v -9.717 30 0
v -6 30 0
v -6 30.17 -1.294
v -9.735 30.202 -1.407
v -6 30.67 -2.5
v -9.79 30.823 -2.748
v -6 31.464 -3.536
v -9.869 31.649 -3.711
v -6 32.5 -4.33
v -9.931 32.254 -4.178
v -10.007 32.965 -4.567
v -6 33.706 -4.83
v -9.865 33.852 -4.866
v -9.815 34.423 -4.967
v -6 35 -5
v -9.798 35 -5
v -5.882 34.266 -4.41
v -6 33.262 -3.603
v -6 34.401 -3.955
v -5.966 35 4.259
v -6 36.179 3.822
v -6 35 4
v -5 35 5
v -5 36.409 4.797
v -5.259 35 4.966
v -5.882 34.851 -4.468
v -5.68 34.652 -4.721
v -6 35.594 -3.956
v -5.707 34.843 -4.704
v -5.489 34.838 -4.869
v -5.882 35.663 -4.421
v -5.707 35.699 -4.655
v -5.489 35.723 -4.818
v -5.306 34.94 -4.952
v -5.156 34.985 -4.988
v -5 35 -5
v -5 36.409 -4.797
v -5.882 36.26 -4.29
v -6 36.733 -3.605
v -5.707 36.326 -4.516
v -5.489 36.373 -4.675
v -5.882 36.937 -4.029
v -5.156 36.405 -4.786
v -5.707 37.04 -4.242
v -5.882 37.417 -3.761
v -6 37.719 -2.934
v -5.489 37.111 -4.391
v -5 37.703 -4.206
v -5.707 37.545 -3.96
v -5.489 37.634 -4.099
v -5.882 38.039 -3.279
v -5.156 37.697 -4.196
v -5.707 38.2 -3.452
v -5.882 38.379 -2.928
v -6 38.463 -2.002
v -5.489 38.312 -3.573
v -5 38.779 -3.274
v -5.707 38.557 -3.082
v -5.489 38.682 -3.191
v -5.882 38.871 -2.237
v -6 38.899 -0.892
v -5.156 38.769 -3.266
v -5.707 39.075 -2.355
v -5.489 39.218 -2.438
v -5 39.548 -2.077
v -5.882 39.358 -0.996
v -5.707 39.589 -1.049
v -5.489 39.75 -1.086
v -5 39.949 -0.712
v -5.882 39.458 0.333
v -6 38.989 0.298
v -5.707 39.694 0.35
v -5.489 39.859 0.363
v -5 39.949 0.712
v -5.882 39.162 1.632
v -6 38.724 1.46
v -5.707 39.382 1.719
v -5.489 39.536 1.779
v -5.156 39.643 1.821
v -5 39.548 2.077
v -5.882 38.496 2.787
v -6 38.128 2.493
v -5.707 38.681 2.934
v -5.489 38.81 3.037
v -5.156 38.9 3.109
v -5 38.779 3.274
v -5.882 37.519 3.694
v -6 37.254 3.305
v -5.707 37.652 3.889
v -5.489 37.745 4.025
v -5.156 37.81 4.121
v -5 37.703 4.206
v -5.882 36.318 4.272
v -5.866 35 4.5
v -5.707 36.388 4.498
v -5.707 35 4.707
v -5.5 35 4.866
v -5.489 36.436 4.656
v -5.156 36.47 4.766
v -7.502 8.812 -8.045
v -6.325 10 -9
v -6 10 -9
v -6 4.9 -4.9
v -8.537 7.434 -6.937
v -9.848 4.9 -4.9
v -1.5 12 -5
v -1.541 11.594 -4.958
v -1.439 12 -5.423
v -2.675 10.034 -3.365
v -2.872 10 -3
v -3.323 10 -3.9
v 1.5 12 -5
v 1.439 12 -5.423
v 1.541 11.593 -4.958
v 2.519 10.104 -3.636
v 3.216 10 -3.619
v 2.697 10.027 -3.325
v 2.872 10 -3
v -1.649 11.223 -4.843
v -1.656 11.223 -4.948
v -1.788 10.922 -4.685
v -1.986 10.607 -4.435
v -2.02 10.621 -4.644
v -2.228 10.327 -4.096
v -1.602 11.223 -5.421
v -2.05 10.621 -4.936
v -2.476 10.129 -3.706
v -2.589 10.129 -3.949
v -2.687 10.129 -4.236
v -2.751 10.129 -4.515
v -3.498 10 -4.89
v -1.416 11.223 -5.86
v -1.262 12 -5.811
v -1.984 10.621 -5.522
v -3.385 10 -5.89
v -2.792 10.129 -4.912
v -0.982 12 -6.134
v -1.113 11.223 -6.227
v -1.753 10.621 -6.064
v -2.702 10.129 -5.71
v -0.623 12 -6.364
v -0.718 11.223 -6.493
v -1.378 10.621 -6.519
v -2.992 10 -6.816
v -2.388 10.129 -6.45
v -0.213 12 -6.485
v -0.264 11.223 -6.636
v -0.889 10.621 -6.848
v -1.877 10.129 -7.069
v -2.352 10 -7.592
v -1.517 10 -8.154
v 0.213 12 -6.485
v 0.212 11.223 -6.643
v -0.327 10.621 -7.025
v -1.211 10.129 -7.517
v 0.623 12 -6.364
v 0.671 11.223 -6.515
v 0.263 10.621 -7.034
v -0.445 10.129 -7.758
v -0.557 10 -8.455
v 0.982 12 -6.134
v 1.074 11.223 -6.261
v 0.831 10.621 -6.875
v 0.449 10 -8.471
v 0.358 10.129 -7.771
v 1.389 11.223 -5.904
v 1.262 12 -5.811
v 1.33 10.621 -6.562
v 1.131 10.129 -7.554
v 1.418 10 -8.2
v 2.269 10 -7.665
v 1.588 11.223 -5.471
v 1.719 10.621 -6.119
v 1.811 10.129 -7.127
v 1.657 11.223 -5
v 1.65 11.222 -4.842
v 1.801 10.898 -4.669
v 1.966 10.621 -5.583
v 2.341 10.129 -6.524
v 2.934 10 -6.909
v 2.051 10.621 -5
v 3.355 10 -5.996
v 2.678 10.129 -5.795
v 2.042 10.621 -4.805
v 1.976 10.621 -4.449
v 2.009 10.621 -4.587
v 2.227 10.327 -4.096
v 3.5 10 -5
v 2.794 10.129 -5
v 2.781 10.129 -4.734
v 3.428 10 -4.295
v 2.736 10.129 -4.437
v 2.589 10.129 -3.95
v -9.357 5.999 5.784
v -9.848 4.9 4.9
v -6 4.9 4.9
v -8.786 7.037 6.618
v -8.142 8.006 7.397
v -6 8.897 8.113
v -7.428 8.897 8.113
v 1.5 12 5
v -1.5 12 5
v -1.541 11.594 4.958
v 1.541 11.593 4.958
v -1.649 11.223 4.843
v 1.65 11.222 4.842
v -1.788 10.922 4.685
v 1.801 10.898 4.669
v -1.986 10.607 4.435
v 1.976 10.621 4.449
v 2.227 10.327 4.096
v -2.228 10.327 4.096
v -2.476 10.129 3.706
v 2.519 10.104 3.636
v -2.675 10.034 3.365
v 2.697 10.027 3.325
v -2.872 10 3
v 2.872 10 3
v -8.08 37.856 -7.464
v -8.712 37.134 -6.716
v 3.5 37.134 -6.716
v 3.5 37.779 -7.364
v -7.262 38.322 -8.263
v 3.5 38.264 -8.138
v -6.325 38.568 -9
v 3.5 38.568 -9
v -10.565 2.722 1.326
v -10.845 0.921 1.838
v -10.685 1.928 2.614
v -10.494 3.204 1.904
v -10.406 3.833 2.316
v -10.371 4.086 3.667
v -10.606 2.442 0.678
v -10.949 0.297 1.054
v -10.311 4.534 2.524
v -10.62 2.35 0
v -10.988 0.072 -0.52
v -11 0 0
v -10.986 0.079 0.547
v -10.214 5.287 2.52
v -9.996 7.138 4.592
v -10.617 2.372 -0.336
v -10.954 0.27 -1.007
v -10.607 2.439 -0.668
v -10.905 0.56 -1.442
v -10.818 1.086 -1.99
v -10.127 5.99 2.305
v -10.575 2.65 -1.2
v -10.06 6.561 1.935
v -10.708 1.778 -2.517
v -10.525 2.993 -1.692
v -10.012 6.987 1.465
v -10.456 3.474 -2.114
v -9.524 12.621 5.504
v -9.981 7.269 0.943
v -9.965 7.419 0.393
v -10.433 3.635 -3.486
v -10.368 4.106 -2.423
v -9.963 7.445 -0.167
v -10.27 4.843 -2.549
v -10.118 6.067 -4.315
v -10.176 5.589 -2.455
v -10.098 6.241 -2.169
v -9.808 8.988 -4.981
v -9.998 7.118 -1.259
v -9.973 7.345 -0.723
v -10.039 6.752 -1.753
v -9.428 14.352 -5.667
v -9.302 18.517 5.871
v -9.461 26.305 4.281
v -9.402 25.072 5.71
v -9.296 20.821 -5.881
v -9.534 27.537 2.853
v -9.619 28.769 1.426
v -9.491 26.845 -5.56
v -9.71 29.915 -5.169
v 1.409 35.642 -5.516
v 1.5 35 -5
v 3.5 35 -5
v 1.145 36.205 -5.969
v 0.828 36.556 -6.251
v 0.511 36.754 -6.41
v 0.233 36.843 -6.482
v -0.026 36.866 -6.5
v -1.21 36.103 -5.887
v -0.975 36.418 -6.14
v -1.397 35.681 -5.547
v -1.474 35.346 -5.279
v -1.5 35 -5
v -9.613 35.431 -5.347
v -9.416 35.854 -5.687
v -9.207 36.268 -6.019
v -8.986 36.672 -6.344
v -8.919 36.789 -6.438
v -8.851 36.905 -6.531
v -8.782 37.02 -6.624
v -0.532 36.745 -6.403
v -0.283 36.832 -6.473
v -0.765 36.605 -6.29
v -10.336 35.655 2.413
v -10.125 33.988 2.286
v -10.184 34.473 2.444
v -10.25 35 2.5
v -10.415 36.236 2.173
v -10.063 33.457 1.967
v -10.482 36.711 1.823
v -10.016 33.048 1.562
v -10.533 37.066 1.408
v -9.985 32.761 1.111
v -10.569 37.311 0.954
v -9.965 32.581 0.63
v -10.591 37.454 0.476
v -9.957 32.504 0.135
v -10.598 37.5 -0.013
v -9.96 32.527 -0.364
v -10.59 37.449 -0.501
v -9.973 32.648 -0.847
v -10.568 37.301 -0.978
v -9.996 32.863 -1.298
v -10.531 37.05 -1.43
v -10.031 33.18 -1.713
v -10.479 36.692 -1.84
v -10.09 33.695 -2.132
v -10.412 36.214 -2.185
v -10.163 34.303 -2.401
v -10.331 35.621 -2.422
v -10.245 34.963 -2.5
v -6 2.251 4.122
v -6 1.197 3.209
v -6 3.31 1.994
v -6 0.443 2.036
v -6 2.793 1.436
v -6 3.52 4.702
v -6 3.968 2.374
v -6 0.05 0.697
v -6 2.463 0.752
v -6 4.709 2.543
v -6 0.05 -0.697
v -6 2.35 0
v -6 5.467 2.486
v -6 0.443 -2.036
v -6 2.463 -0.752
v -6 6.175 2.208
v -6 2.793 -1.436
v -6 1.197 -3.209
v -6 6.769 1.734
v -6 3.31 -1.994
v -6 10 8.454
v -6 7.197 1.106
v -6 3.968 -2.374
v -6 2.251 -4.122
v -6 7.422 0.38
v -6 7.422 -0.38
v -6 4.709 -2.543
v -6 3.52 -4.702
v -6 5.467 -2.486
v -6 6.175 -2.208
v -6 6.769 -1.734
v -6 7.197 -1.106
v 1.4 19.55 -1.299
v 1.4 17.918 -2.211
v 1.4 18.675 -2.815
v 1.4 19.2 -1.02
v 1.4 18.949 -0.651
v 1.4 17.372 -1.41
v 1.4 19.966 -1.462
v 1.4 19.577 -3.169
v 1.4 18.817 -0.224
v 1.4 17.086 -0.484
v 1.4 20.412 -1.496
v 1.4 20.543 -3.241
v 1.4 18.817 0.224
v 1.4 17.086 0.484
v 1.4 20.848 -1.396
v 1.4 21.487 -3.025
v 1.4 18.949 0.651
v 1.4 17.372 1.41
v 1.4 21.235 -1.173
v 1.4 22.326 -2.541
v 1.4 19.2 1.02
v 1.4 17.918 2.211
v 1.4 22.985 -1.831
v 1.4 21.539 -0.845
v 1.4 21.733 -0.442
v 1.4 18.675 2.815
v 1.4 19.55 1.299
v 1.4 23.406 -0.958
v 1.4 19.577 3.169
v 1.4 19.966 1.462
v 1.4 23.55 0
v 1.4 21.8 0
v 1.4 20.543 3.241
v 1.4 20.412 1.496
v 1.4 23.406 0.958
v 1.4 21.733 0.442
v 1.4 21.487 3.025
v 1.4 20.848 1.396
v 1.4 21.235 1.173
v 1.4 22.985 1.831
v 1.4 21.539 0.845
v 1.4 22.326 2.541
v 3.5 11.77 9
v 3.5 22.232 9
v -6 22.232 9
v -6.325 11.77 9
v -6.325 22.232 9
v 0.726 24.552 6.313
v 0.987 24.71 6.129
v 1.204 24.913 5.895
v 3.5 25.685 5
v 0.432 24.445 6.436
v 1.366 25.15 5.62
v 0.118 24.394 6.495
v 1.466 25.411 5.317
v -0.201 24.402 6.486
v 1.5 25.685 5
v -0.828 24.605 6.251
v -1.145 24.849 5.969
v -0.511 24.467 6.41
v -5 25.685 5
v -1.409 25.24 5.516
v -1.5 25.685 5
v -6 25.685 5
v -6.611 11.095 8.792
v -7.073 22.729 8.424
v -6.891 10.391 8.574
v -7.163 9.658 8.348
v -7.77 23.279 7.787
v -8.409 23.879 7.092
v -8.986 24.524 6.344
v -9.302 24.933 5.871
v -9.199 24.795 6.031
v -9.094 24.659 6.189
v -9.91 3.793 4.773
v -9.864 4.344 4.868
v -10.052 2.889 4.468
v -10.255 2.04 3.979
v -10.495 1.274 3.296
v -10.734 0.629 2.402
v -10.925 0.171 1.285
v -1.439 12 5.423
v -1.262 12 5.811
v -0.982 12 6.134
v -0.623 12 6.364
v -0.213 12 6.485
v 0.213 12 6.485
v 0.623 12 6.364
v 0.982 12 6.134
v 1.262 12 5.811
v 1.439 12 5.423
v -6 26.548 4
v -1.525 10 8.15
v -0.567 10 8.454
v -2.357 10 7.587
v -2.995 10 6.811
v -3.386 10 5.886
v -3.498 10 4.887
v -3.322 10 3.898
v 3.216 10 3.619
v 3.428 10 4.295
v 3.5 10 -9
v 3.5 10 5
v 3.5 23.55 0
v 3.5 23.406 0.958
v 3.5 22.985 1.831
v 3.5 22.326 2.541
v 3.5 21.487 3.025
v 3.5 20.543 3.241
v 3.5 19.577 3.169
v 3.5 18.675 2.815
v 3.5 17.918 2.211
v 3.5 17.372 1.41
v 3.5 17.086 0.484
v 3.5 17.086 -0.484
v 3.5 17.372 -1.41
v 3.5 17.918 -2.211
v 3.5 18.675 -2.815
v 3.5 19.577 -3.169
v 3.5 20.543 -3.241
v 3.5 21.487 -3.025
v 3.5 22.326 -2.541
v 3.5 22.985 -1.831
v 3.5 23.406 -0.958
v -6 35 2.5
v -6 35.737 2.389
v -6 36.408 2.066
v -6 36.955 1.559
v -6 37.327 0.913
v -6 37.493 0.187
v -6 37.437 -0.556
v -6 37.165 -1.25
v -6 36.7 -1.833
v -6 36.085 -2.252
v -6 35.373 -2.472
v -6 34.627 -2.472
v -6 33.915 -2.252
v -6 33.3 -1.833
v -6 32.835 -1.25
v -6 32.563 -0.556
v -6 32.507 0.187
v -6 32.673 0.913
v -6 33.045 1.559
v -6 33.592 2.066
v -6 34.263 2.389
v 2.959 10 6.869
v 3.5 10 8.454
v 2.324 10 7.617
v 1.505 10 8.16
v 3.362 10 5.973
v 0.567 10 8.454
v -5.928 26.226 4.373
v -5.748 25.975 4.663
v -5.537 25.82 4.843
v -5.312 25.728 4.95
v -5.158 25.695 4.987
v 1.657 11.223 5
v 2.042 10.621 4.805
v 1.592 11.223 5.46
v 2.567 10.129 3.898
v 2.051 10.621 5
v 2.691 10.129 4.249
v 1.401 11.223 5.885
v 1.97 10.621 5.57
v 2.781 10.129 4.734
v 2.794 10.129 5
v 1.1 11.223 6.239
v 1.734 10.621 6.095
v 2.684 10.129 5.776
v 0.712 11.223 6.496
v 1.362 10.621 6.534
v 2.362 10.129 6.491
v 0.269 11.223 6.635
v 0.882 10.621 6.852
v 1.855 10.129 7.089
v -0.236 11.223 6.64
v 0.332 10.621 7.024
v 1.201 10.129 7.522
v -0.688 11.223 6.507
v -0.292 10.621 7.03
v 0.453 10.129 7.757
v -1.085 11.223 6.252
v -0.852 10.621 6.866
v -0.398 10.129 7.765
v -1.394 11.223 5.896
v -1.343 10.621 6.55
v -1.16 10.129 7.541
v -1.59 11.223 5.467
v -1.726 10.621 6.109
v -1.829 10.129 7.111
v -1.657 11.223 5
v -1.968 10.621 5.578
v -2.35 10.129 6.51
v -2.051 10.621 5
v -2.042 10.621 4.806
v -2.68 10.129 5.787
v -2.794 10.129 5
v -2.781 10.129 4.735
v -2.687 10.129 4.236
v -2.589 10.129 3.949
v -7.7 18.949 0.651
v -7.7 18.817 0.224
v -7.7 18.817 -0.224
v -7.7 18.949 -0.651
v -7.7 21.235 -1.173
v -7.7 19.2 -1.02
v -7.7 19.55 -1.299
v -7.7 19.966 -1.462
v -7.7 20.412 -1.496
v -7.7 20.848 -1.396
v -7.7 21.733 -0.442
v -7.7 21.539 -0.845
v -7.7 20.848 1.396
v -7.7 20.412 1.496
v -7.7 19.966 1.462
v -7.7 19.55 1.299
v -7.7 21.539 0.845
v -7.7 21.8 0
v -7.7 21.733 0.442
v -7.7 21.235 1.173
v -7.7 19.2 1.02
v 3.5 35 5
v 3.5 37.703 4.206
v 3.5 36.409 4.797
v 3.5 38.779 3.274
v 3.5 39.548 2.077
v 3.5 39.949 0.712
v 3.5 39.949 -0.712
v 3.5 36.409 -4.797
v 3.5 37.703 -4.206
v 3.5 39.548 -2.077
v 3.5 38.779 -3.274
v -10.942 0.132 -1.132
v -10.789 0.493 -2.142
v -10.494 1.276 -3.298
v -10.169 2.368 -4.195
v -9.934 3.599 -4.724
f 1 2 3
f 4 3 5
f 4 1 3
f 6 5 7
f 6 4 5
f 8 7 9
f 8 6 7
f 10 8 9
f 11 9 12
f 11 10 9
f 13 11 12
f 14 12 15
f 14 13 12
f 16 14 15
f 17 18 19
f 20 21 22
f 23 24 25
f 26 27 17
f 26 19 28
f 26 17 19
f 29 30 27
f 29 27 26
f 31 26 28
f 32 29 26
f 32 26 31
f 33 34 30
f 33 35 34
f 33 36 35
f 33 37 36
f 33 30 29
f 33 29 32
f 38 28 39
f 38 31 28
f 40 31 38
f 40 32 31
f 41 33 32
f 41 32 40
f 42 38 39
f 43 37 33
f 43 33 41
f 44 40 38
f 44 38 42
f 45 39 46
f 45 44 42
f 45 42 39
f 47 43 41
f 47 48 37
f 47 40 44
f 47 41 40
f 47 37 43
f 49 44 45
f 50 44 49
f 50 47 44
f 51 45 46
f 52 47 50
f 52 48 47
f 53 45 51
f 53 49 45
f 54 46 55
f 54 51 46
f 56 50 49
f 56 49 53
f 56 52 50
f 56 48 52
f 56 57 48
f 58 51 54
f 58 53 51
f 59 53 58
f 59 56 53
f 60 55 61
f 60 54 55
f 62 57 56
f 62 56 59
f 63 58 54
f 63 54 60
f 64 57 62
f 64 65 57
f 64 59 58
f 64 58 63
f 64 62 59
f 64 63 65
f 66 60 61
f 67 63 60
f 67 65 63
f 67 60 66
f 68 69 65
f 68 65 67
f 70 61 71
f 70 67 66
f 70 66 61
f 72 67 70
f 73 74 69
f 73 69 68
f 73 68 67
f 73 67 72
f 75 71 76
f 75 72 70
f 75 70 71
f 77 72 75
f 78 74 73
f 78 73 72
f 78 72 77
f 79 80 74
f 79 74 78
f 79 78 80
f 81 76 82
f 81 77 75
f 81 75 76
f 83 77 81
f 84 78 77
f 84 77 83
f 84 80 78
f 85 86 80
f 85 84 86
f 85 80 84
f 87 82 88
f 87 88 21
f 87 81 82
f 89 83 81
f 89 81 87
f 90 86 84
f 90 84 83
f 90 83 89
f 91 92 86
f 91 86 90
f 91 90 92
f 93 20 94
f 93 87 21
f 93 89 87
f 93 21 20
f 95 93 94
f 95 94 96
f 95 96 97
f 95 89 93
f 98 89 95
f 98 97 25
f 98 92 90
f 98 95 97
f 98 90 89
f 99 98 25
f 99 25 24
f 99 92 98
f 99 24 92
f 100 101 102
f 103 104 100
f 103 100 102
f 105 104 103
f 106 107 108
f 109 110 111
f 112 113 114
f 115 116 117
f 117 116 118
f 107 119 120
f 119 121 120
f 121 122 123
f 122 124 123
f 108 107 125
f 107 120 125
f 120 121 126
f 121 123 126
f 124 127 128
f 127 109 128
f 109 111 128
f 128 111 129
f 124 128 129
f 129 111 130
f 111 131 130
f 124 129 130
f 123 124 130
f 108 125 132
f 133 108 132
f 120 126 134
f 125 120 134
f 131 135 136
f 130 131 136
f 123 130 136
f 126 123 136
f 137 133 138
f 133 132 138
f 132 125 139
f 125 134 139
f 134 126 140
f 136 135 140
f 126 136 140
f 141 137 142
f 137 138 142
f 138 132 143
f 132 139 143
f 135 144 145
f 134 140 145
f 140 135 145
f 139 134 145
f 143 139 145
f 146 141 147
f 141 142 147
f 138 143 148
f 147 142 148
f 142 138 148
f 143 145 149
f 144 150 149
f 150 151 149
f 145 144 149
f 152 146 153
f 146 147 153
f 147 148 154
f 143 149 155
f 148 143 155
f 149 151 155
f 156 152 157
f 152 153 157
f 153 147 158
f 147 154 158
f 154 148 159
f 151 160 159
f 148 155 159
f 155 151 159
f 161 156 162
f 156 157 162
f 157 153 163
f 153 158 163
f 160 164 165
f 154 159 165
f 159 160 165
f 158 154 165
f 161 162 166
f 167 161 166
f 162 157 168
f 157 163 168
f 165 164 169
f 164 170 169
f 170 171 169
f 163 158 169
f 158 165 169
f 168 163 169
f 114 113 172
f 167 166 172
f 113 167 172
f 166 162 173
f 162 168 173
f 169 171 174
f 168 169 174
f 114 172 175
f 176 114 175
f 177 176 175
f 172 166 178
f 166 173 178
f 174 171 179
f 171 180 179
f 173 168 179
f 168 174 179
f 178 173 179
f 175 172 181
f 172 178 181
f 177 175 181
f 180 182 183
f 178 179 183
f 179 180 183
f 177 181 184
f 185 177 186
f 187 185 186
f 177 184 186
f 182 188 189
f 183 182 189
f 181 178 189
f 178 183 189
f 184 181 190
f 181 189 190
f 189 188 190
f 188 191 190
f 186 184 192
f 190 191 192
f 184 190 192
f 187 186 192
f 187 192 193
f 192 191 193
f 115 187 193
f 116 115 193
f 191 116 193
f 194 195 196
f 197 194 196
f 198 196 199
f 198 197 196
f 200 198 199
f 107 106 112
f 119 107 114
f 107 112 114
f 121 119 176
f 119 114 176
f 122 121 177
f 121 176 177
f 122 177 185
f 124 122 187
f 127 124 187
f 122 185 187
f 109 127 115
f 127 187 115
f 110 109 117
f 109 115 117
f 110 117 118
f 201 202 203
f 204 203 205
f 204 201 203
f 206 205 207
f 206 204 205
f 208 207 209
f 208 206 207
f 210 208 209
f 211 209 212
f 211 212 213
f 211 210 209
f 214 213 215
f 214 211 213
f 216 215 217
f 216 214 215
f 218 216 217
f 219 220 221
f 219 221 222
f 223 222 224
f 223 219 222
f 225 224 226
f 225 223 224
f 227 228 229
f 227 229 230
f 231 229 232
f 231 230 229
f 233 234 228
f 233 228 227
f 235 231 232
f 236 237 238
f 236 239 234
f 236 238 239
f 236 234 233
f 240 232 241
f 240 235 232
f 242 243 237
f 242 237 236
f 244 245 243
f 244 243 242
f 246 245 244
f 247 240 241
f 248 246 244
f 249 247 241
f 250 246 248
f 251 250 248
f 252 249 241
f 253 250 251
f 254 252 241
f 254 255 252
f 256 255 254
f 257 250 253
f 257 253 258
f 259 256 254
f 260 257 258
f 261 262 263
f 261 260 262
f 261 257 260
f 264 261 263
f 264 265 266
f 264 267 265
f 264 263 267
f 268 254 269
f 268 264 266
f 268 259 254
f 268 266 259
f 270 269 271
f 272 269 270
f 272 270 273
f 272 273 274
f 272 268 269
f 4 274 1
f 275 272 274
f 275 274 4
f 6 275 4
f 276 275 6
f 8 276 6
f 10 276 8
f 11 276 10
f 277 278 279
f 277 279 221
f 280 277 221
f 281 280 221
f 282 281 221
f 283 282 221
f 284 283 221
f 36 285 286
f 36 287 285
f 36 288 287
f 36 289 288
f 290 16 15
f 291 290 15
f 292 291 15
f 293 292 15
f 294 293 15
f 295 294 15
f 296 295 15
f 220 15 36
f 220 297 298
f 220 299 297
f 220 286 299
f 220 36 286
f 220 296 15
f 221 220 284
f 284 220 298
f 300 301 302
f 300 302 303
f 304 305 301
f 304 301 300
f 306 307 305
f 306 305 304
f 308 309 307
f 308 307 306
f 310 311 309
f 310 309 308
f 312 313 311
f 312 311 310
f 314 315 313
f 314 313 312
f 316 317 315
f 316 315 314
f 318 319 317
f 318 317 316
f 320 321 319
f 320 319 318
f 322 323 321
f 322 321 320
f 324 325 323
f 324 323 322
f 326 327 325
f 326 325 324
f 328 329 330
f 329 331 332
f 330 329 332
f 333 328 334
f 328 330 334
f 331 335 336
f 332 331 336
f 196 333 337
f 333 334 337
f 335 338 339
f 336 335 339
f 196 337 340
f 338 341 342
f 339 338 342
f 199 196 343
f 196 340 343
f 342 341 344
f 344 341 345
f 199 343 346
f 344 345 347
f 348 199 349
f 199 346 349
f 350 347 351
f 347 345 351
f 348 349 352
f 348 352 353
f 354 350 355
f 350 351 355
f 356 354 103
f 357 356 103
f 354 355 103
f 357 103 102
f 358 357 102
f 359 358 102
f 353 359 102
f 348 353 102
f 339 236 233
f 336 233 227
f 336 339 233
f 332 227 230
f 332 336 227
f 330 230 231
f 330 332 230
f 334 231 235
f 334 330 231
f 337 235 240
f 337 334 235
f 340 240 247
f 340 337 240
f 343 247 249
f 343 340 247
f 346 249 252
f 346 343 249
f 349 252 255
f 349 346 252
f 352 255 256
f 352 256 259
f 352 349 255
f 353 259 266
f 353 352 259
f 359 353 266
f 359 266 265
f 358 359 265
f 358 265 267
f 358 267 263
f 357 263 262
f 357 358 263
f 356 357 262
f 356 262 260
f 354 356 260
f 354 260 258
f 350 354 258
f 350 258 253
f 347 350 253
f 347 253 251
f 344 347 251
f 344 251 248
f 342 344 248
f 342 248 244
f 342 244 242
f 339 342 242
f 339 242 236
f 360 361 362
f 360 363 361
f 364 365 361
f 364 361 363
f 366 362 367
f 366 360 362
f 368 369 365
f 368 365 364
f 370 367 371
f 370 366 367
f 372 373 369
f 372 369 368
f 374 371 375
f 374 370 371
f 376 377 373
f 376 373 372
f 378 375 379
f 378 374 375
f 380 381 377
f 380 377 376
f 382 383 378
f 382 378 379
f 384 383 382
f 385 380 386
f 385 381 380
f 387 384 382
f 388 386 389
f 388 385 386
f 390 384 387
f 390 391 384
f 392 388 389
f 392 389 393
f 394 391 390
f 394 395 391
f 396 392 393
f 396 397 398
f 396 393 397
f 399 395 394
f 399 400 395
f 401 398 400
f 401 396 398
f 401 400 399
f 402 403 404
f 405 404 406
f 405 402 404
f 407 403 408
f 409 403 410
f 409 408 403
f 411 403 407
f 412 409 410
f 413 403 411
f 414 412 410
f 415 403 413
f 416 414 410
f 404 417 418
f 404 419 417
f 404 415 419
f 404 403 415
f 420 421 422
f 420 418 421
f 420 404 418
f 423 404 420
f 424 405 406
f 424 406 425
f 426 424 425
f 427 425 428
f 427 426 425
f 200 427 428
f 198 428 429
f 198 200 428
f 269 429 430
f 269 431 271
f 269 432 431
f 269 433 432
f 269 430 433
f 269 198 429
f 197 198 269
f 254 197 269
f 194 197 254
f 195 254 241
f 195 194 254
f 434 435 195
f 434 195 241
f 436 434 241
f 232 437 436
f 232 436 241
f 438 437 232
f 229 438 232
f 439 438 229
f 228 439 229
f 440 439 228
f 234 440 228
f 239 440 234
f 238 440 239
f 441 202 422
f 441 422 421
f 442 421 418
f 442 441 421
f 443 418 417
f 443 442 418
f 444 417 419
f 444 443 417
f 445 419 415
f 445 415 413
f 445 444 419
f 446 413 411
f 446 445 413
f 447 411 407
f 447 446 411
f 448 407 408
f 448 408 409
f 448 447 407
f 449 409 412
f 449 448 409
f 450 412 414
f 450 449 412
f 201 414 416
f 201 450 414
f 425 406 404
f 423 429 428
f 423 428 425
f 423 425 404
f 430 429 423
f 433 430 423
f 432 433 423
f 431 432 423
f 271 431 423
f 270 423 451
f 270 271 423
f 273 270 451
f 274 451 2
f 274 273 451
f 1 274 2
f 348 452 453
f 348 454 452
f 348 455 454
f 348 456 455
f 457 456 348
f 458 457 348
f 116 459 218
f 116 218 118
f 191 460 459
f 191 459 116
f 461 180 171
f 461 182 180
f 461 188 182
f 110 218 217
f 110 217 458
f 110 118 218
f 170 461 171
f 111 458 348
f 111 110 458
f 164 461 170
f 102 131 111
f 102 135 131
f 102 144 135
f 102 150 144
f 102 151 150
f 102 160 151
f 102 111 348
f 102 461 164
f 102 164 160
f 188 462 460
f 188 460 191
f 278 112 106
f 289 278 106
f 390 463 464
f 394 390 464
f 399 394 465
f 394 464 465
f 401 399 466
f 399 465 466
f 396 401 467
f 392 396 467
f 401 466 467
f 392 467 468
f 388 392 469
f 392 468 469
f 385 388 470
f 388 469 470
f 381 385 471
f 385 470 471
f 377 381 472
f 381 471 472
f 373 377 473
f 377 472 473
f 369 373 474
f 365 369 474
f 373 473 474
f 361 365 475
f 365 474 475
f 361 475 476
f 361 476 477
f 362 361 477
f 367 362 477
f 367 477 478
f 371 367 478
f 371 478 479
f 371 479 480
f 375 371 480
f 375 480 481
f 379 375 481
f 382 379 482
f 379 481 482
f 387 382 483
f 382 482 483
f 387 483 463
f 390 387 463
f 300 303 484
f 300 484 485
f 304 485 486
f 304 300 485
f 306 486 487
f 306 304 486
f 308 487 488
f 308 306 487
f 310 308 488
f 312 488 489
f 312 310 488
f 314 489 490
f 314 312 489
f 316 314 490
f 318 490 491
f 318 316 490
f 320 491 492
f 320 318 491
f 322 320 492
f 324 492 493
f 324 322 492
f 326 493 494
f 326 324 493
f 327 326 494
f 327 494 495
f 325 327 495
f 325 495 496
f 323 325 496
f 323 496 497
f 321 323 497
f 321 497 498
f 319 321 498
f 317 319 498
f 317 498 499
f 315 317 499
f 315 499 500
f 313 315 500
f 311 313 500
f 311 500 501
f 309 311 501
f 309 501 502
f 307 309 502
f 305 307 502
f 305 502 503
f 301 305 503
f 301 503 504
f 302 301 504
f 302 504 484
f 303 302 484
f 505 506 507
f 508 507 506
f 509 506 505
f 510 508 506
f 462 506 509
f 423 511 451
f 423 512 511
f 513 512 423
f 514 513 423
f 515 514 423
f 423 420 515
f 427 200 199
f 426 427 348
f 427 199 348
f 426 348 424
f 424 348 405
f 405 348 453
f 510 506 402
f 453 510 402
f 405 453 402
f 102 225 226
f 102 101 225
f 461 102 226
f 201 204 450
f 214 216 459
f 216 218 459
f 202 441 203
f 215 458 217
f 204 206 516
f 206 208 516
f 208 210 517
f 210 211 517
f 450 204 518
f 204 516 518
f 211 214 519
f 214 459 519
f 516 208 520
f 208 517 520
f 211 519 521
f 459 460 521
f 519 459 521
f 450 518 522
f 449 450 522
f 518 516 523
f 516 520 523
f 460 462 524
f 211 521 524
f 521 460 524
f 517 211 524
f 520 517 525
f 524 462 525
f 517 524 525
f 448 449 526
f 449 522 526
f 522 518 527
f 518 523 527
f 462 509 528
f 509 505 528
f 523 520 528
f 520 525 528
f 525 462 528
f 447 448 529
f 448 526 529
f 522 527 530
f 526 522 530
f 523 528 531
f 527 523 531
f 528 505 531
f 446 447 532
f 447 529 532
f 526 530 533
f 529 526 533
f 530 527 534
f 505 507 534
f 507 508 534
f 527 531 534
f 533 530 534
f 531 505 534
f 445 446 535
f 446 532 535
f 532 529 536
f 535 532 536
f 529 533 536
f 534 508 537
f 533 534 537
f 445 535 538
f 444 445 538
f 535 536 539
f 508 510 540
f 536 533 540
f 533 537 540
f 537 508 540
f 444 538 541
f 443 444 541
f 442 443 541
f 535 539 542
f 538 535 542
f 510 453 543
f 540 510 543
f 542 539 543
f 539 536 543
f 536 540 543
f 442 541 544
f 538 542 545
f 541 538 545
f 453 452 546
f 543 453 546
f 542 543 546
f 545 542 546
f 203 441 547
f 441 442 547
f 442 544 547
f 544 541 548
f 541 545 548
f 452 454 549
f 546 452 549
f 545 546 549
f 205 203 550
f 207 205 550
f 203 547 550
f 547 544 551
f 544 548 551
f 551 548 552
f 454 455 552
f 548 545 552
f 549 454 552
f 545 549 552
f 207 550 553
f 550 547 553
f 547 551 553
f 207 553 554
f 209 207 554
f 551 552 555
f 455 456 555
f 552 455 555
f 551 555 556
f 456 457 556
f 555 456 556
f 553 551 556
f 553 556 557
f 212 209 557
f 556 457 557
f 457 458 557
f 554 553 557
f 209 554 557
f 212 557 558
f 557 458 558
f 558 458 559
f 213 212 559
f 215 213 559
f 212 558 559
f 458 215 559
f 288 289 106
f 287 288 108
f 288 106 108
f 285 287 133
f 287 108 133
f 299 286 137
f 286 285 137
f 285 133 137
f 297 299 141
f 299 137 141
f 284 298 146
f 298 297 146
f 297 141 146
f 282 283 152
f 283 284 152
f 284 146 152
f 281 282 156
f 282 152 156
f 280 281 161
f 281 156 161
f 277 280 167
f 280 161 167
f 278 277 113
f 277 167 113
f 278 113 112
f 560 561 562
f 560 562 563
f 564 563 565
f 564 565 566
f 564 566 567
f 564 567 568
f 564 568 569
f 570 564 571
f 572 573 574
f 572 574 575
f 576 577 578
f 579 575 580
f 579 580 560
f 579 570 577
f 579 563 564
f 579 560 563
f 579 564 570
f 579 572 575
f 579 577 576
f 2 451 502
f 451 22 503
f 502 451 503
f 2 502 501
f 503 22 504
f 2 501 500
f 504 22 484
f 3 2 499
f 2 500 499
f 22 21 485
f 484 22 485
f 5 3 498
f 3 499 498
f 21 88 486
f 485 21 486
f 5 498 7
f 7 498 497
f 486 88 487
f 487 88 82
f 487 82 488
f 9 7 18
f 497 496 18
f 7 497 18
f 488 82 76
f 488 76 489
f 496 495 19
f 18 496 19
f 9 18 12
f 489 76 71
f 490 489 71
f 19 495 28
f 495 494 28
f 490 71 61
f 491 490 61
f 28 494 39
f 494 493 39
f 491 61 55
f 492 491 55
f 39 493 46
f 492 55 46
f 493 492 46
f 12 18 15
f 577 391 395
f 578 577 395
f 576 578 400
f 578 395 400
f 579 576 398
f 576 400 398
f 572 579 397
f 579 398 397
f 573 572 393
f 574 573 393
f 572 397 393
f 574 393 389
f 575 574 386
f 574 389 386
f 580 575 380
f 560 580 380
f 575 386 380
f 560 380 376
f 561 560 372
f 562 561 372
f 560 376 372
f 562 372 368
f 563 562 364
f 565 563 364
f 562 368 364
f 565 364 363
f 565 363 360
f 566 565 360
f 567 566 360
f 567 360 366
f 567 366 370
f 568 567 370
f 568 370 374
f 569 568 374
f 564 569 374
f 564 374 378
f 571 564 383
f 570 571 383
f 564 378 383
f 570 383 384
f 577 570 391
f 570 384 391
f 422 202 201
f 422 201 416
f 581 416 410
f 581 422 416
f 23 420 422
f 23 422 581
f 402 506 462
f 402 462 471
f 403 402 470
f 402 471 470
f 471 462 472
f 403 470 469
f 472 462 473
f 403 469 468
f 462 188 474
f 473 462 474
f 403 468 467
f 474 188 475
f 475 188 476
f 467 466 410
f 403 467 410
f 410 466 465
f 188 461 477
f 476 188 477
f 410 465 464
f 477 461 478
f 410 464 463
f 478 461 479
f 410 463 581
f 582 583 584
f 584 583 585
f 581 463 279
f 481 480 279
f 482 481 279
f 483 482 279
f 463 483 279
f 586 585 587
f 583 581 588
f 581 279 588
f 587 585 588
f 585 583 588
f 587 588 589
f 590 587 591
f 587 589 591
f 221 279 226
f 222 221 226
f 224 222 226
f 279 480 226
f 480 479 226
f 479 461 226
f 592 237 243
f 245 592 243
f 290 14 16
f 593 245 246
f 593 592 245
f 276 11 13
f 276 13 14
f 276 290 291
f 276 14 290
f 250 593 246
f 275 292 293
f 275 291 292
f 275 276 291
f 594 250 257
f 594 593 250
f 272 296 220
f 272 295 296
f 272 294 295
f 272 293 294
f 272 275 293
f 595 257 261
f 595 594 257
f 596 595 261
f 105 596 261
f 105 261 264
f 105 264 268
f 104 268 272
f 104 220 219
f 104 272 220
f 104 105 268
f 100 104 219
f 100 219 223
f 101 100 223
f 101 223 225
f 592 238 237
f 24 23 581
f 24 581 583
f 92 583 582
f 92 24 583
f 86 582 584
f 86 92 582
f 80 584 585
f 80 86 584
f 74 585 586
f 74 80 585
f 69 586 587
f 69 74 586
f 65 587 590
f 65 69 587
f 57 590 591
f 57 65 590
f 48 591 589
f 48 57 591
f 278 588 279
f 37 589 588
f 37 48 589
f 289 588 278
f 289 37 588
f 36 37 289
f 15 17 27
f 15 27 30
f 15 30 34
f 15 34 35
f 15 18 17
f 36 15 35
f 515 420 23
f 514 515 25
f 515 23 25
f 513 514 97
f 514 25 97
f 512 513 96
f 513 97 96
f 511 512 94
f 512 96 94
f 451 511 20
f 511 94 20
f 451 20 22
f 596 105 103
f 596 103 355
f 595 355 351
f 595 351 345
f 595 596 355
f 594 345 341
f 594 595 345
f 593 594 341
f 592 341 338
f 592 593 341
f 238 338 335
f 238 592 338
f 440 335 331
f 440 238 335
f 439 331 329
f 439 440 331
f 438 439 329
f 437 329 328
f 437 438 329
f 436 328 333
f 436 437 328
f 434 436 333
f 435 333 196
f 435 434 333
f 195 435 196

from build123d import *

# Parameters (mm, degrees)
BOSS_EXTRUDE1_DEPTH      = 40
CUT_EXTRUDE1_DEPTH       = 58
CUT_EXTRUDE2_REACH       = 47.222
SKETCH3_W                = 12
SKETCH3_H                = 10
SKETCH4_R                = 2.55
CUT_EXTRUDE3_DEPTH       = 17.5
FILLET4_R                = 2
CUT_EXTRUDE5_START       = -12.324555
SKETCH6_R                = 2.5
CUT_EXTRUDE5_DEPTH       = 9.6
CUT_EXTRUDE6_START       = 6.279445
SKETCH6_3_R              = 2.5
CUT_EXTRUDE6_DEPTH       = 6.604
CUT_EXTRUDE7_START       = -14.986
CUT_EXTRUDE7_DEPTH       = 14.986
CUT_EXTRUDE14_DEPTH      = 10
CUT_EXTRUDE14_DEPTH_BACK = 20
FILLET3_R                = 1
CUT_EXTRUDE17_DEPTH      = 9
CUT_EXTRUDE17_DEPTH_BACK = 31
SKETCH19_W               = 18.14397799
SKETCH19_H               = 52.511082079
SKETCH20_R               = 3.25
CUT_EXTRUDE18_DEPTH      = 2.1
SKETCH21_R               = 1.5
CUT_EXTRUDE19_DEPTH      = 9.1
CUT_EXTRUDE20_DEPTH      = 14
CUT_EXTRUDE20_DEPTH_BACK = 14


with BuildPart() as part:
    # Sketch1 → Boss-Extrude1 (new body)
    with BuildSketch(Plane(origin=(0, 0, 0), x_dir=(1, 0, 0), z_dir=(0, 1, 0))):
        with BuildLine():
            Line((-6.32455532, 9), (6.32455532, 9))
            ThreePointArc((6.32455532, 9), (11, 0), (6.32455532, -9))
            Line((6.32455532, -9), (-6.32455532, -9))
            ThreePointArc((-6.32455532, -9), (-11, 0), (-6.32455532, 9))
        make_face()
    extrude(amount=BOSS_EXTRUDE1_DEPTH)

    # Sketch2 → Cut-Extrude1 (cut)
    with BuildSketch(Plane.XZ):
        with BuildLine():
            Line((1.5, 5), (-1.5, 5))
            ThreePointArc((-1.5, 5), (0, 6.5), (1.5, 5))
        make_face()
        with BuildLine():
            Line((1.5, -5), (-1.5, -5))
            ThreePointArc((-1.5, -5), (0, -6.5), (1.5, -5))
        make_face()
    extrude(amount=-CUT_EXTRUDE1_DEPTH, mode=Mode.SUBTRACT)

    # Cut-Extrude2: up to this face of the body (flat: up to its plane)
    cut_extrude2_end = Plane(part.part.faces().sort_by_distance((0, 20, 9))[0])
    # Sketch3 → Cut-Extrude2 (cut, up to the picked face)
    with BuildSketch(Plane(origin=(0, 0, -9), x_dir=(-1, 0, 0), z_dir=(0, 0, -1)), mode=Mode.PRIVATE) as cut_extrude2_sk1:
        with Locations((0, 5)):
            Rectangle(SKETCH3_W, SKETCH3_H)
    cut_extrude2_tool1 = split(extrude(cut_extrude2_sk1.sketch, amount=-CUT_EXTRUDE2_REACH, mode=Mode.PRIVATE), bisect_by=cut_extrude2_end, keep=Keep.BOTH, mode=Mode.PRIVATE)
    add(cut_extrude2_tool1.solids().sort_by(Axis((0, 5, -9), (0, 0, 1)))[0], mode=Mode.SUBTRACT)

    # Sketch4 → Cut-Extrude3 (cut, symmetric)
    with BuildSketch(Plane.ZY.offset(-6)):
        with Locations(Location((0, 4.9, 0), (0, 0, 270))):
            Circle(SKETCH4_R)
        with BuildLine():
            Line((-9, 10), (-4.9, 4.9))
            ThreePointArc((-4.9, 4.9), (0, 0), (4.9, 4.9))
            Line((4.9, 4.9), (9, 10))
            Line((9, 10), (12.043777938, -1.930413563))
            Line((12.043777938, -1.930413563), (-10.290438773, -1.930413563))
            Line((-10.290438773, -1.930413563), (-9, 10))
        make_face()
    extrude(amount=CUT_EXTRUDE3_DEPTH, both=True, mode=Mode.SUBTRACT)

    # Fillet4
    fillet4_edges = [part.edges().sort_by_distance(p)[0] for p in [
        (0, 10, 5),
        (0, 10, 6.5),
        (0, 10, -5),
        (0, 10, -6.5),
    ]]
    fillet(fillet4_edges, radius=FILLET4_R)

    # Sketch6 → Cut-Extrude5 (cut)
    with BuildSketch(Plane.ZY.offset(6.32455532).offset(CUT_EXTRUDE5_START)):
        with BuildLine():
            Line((9, 22.232353468), (0, 30))
            ThreePointArc((0, 30), (-3.535533906, 31.464466094), (-5, 35))
            Line((-5, 35), (-6.715621335, 37.134065563))
            ThreePointArc((-6.715621335, 37.134065563), (-7.737273484, 38.043034193), (-9, 38.567933069))
            Line((-9, 38.567933069), (-20.985236203, 70.297327945))
            Line((-20.985236203, 70.297327945), (29.827478779, 37.594689174))
            Line((29.827478779, 37.594689174), (9, 22.232353468))
        make_face()
        with Locations((0, 35)):
            Circle(SKETCH6_R, mode=Mode.SUBTRACT)
    extrude(amount=-CUT_EXTRUDE5_DEPTH, mode=Mode.SUBTRACT)

    # Sketch6<3> → Cut-Extrude6 (cut)
    with BuildSketch(Plane.ZY.offset(6.32455532).offset(CUT_EXTRUDE6_START)):
        with BuildLine():
            Line((9, 22.232353468), (0, 30))
            ThreePointArc((0, 30), (-3.535533906, 31.464466094), (-5, 35))
            Line((-5, 35), (-6.715621335, 37.134065563))
            ThreePointArc((-6.715621335, 37.134065563), (-7.737273484, 38.043034193), (-9, 38.567933069))
            Line((-9, 38.567933069), (-20.985236203, 70.297327945))
            Line((-20.985236203, 70.297327945), (29.827478779, 37.594689174))
            Line((29.827478779, 37.594689174), (9, 22.232353468))
        make_face()
        with Locations((0, 35)):
            Circle(SKETCH6_3_R, mode=Mode.SUBTRACT)
    extrude(amount=-CUT_EXTRUDE6_DEPTH, mode=Mode.SUBTRACT)

    # Sketch7 → Cut-Extrude7 (cut)
    with BuildSketch(Plane(origin=(6, 0, 0), x_dir=(0, 0, -1), z_dir=(1, 0, 0)).offset(CUT_EXTRUDE7_START)):
        with BuildLine():
            Line((5, 35), (6.715621335, 37.134065563))
            ThreePointArc((6.715621335, 37.134065563), (7.737273484, 38.043034193), (9, 38.567933069))
            Line((9, 38.567933069), (57.758012517, 25.684640815))
            Line((57.758012517, 25.684640815), (-30.579133969, 55.486762513))
            Line((-30.579133969, 55.486762513), (-9, 22.232353468))
            Line((-9, 22.232353468), (-5, 25.684640815))
            Line((-5, 25.684640815), (-5, 35))
            ThreePointArc((-5, 35), (0, 40), (5, 35))
        make_face()
    extrude(amount=CUT_EXTRUDE7_DEPTH, mode=Mode.SUBTRACT)

    # Sketch16 → Cut-Extrude14 (cut, two sides: drawn at the far end of the back side and taken through both)
    with BuildSketch(Plane.ZY.offset(6.32455532).offset(-CUT_EXTRUDE14_DEPTH_BACK)):
        Polygon((8.113259987, 8.896981935), (11.550119513, 20.031417135), (18.056002312, 15.695207893), (16.156055326, 2.281594324), align=None)
    extrude(amount=CUT_EXTRUDE14_DEPTH + CUT_EXTRUDE14_DEPTH_BACK, mode=Mode.SUBTRACT)

    # Fillet3
    # the kernel refuses this fillet: 1 mm, written as the material it takes off along each edge
    with BuildSketch(Plane(origin=(5.99999968, 23.184640014, 5), x_dir=(-1, 0, 0), z_dir=(0, 1, 0))) as fillet3_piece_1_section:
        with BuildLine():
            CenterArc((FILLET3_R, -FILLET3_R), FILLET3_R, 90, 90)
            Line((0, -FILLET3_R), (0, 0))
            Line((0, 0), (FILLET3_R, 0))
        make_face()
    fillet3_piece_1 = extrude(amount=11.815359986, mode=Mode.PRIVATE)
    fillet3_piece_1 = split(fillet3_piece_1, bisect_by=Plane(origin=(5.764976342, 27.542151825, 2.84779096), z_dir=(0, 0.7570343753275034, 0.653375048936288)), keep=Keep.TOP, mode=Mode.PRIVATE)
    add(fillet3_piece_1, mode=Mode.SUBTRACT)
    with BuildSketch(Plane(origin=(6, 35, 0), x_dir=(0, 0, 1), z_dir=(0, -1, 0))) as fillet3_piece_2_section:
        with BuildLine():
            CenterArc((4, 1.00000032), FILLET3_R, 270, 90)
            ThreePointArc((4, 3.2e-07), (4.5, 3.2e-07), (5, 0))
            Line((5, 0), (5, 1.00000032))
        make_face()
    fillet3_piece_2 = revolve(axis=Axis((6, 35, 0), (-1, 0, 0)), revolution_arc=208.693968336, mode=Mode.PRIVATE)
    fillet3_piece_2 = split(fillet3_piece_2, bisect_by=Plane(origin=(5.717618036, 35.865387036, -5.695703303), z_dir=(0, 0.6265569118246592, 0.7793756708062848)), keep=Keep.TOP, mode=Mode.PRIVATE)
    add(fillet3_piece_2, mode=Mode.SUBTRACT)
    with BuildSketch(Plane(origin=(-6.00000032, 35, 0), x_dir=(0, -0.48013104288571373, -0.8771967747646344), z_dir=(0, -0.8771967747646344, 0.48013104288571373))) as fillet3_piece_3_section:
        with BuildLine():
            CenterArc((5 - FILLET3_R, FILLET3_R), FILLET3_R, 270, 90)
            Line((5 - FILLET3_R, 0), (5, 0))
            Line((5, 0), (5, FILLET3_R))
        make_face()
    fillet3_piece_3 = revolve(axis=Axis((-6.00000032, 35, 0), (1, 0, 0)), revolution_arc=208.69396098, mode=Mode.PRIVATE)
    fillet3_piece_3 = split(fillet3_piece_3, bisect_by=Plane(origin=(-5.717618693, 35.865387047, -5.695703312), z_dir=(0, 0.6265569118246592, 0.7793756708062848)), keep=Keep.TOP, mode=Mode.PRIVATE)
    add(fillet3_piece_3, mode=Mode.SUBTRACT)
    with BuildSketch(Plane(origin=(-6.00000032, 35, 5), x_dir=(0, 0, -1), z_dir=(0, -1, 0))) as fillet3_piece_4_section:
        with BuildLine():
            CenterArc((FILLET3_R, FILLET3_R), FILLET3_R, 180, 90)
            Line((0, FILLET3_R), (0, 0))
            Line((0, 0), (FILLET3_R, 0))
        make_face()
    fillet3_piece_4 = extrude(amount=11.815359185, mode=Mode.PRIVATE)
    fillet3_piece_4 = split(fillet3_piece_4, bisect_by=Plane(origin=(-5.831638777, 29.468233552, 0.616132314), z_dir=(0, 0.7570343753275034, 0.653375048936288)), keep=Keep.TOP, mode=Mode.PRIVATE)
    add(fillet3_piece_4, mode=Mode.SUBTRACT)

    # Sketch19 → Cut-Extrude17 (cut, two sides: drawn at the far end of the back side and taken through both)
    with BuildSketch(Plane.XY.offset(5).offset(-CUT_EXTRUDE17_DEPTH_BACK)):
        with Locations((12.571988995, 20.723484304)):
            Rectangle(SKETCH19_W, SKETCH19_H)
    extrude(amount=CUT_EXTRUDE17_DEPTH + CUT_EXTRUDE17_DEPTH_BACK, mode=Mode.SUBTRACT)

    # Sketch20 → Cut-Extrude18 (cut)
    with BuildSketch(Plane(origin=(3.5, 0, 0), x_dir=(0, 0, -1), z_dir=(1, 0, 0))):
        with Locations(Location((0, 20.3, 0), (0, 0, 90))):
            Circle(SKETCH20_R)
    extrude(amount=-CUT_EXTRUDE18_DEPTH, mode=Mode.SUBTRACT)

    # Sketch21 → Cut-Extrude19 (cut)
    with BuildSketch(Plane(origin=(1.4, 0, 0), x_dir=(0, 0, -1), z_dir=(1, 0, 0))):
        with Locations(Location((0, 20.3, 0), (0, 0, 90))):
            Circle(SKETCH21_R)
    extrude(amount=-CUT_EXTRUDE19_DEPTH, mode=Mode.SUBTRACT)

    # Sketch17 → Cut-Extrude20 (cut, two sides: drawn at the far end of the back side and taken through both)
    with BuildSketch(Plane.XY.offset(-CUT_EXTRUDE20_DEPTH_BACK)):
        with BuildLine():
            Line((11, 0), (21.82042967, 52.006672347))
            Line((21.82042967, 52.006672347), (-19.981455648, 54.836748038))
            Line((-19.981455648, 54.836748038), (-22.103338511, 10.056999989))
            Line((-22.103338511, 10.056999989), (-11, 0))
            ThreePointArc((-11, 0), (-9.292734081, 20), (-11, 40))
            Line((-11, 40), (-14.776436098, 42.476608752))
            Line((-14.776436098, 42.476608752), (-7.177261686, 49.84322342))
            Line((-7.177261686, 49.84322342), (9.09969288, 46.456664847))
            Line((9.09969288, 46.456664847), (16.101427872, 37.54860329))
            Line((16.101427872, 37.54860329), (11, 40))
            ThreePointArc((11, 40), (9.292734081, 20), (11, 0))
        make_face()
    extrude(amount=CUT_EXTRUDE20_DEPTH + CUT_EXTRUDE20_DEPTH_BACK, mode=Mode.SUBTRACT)


solid = part.part
